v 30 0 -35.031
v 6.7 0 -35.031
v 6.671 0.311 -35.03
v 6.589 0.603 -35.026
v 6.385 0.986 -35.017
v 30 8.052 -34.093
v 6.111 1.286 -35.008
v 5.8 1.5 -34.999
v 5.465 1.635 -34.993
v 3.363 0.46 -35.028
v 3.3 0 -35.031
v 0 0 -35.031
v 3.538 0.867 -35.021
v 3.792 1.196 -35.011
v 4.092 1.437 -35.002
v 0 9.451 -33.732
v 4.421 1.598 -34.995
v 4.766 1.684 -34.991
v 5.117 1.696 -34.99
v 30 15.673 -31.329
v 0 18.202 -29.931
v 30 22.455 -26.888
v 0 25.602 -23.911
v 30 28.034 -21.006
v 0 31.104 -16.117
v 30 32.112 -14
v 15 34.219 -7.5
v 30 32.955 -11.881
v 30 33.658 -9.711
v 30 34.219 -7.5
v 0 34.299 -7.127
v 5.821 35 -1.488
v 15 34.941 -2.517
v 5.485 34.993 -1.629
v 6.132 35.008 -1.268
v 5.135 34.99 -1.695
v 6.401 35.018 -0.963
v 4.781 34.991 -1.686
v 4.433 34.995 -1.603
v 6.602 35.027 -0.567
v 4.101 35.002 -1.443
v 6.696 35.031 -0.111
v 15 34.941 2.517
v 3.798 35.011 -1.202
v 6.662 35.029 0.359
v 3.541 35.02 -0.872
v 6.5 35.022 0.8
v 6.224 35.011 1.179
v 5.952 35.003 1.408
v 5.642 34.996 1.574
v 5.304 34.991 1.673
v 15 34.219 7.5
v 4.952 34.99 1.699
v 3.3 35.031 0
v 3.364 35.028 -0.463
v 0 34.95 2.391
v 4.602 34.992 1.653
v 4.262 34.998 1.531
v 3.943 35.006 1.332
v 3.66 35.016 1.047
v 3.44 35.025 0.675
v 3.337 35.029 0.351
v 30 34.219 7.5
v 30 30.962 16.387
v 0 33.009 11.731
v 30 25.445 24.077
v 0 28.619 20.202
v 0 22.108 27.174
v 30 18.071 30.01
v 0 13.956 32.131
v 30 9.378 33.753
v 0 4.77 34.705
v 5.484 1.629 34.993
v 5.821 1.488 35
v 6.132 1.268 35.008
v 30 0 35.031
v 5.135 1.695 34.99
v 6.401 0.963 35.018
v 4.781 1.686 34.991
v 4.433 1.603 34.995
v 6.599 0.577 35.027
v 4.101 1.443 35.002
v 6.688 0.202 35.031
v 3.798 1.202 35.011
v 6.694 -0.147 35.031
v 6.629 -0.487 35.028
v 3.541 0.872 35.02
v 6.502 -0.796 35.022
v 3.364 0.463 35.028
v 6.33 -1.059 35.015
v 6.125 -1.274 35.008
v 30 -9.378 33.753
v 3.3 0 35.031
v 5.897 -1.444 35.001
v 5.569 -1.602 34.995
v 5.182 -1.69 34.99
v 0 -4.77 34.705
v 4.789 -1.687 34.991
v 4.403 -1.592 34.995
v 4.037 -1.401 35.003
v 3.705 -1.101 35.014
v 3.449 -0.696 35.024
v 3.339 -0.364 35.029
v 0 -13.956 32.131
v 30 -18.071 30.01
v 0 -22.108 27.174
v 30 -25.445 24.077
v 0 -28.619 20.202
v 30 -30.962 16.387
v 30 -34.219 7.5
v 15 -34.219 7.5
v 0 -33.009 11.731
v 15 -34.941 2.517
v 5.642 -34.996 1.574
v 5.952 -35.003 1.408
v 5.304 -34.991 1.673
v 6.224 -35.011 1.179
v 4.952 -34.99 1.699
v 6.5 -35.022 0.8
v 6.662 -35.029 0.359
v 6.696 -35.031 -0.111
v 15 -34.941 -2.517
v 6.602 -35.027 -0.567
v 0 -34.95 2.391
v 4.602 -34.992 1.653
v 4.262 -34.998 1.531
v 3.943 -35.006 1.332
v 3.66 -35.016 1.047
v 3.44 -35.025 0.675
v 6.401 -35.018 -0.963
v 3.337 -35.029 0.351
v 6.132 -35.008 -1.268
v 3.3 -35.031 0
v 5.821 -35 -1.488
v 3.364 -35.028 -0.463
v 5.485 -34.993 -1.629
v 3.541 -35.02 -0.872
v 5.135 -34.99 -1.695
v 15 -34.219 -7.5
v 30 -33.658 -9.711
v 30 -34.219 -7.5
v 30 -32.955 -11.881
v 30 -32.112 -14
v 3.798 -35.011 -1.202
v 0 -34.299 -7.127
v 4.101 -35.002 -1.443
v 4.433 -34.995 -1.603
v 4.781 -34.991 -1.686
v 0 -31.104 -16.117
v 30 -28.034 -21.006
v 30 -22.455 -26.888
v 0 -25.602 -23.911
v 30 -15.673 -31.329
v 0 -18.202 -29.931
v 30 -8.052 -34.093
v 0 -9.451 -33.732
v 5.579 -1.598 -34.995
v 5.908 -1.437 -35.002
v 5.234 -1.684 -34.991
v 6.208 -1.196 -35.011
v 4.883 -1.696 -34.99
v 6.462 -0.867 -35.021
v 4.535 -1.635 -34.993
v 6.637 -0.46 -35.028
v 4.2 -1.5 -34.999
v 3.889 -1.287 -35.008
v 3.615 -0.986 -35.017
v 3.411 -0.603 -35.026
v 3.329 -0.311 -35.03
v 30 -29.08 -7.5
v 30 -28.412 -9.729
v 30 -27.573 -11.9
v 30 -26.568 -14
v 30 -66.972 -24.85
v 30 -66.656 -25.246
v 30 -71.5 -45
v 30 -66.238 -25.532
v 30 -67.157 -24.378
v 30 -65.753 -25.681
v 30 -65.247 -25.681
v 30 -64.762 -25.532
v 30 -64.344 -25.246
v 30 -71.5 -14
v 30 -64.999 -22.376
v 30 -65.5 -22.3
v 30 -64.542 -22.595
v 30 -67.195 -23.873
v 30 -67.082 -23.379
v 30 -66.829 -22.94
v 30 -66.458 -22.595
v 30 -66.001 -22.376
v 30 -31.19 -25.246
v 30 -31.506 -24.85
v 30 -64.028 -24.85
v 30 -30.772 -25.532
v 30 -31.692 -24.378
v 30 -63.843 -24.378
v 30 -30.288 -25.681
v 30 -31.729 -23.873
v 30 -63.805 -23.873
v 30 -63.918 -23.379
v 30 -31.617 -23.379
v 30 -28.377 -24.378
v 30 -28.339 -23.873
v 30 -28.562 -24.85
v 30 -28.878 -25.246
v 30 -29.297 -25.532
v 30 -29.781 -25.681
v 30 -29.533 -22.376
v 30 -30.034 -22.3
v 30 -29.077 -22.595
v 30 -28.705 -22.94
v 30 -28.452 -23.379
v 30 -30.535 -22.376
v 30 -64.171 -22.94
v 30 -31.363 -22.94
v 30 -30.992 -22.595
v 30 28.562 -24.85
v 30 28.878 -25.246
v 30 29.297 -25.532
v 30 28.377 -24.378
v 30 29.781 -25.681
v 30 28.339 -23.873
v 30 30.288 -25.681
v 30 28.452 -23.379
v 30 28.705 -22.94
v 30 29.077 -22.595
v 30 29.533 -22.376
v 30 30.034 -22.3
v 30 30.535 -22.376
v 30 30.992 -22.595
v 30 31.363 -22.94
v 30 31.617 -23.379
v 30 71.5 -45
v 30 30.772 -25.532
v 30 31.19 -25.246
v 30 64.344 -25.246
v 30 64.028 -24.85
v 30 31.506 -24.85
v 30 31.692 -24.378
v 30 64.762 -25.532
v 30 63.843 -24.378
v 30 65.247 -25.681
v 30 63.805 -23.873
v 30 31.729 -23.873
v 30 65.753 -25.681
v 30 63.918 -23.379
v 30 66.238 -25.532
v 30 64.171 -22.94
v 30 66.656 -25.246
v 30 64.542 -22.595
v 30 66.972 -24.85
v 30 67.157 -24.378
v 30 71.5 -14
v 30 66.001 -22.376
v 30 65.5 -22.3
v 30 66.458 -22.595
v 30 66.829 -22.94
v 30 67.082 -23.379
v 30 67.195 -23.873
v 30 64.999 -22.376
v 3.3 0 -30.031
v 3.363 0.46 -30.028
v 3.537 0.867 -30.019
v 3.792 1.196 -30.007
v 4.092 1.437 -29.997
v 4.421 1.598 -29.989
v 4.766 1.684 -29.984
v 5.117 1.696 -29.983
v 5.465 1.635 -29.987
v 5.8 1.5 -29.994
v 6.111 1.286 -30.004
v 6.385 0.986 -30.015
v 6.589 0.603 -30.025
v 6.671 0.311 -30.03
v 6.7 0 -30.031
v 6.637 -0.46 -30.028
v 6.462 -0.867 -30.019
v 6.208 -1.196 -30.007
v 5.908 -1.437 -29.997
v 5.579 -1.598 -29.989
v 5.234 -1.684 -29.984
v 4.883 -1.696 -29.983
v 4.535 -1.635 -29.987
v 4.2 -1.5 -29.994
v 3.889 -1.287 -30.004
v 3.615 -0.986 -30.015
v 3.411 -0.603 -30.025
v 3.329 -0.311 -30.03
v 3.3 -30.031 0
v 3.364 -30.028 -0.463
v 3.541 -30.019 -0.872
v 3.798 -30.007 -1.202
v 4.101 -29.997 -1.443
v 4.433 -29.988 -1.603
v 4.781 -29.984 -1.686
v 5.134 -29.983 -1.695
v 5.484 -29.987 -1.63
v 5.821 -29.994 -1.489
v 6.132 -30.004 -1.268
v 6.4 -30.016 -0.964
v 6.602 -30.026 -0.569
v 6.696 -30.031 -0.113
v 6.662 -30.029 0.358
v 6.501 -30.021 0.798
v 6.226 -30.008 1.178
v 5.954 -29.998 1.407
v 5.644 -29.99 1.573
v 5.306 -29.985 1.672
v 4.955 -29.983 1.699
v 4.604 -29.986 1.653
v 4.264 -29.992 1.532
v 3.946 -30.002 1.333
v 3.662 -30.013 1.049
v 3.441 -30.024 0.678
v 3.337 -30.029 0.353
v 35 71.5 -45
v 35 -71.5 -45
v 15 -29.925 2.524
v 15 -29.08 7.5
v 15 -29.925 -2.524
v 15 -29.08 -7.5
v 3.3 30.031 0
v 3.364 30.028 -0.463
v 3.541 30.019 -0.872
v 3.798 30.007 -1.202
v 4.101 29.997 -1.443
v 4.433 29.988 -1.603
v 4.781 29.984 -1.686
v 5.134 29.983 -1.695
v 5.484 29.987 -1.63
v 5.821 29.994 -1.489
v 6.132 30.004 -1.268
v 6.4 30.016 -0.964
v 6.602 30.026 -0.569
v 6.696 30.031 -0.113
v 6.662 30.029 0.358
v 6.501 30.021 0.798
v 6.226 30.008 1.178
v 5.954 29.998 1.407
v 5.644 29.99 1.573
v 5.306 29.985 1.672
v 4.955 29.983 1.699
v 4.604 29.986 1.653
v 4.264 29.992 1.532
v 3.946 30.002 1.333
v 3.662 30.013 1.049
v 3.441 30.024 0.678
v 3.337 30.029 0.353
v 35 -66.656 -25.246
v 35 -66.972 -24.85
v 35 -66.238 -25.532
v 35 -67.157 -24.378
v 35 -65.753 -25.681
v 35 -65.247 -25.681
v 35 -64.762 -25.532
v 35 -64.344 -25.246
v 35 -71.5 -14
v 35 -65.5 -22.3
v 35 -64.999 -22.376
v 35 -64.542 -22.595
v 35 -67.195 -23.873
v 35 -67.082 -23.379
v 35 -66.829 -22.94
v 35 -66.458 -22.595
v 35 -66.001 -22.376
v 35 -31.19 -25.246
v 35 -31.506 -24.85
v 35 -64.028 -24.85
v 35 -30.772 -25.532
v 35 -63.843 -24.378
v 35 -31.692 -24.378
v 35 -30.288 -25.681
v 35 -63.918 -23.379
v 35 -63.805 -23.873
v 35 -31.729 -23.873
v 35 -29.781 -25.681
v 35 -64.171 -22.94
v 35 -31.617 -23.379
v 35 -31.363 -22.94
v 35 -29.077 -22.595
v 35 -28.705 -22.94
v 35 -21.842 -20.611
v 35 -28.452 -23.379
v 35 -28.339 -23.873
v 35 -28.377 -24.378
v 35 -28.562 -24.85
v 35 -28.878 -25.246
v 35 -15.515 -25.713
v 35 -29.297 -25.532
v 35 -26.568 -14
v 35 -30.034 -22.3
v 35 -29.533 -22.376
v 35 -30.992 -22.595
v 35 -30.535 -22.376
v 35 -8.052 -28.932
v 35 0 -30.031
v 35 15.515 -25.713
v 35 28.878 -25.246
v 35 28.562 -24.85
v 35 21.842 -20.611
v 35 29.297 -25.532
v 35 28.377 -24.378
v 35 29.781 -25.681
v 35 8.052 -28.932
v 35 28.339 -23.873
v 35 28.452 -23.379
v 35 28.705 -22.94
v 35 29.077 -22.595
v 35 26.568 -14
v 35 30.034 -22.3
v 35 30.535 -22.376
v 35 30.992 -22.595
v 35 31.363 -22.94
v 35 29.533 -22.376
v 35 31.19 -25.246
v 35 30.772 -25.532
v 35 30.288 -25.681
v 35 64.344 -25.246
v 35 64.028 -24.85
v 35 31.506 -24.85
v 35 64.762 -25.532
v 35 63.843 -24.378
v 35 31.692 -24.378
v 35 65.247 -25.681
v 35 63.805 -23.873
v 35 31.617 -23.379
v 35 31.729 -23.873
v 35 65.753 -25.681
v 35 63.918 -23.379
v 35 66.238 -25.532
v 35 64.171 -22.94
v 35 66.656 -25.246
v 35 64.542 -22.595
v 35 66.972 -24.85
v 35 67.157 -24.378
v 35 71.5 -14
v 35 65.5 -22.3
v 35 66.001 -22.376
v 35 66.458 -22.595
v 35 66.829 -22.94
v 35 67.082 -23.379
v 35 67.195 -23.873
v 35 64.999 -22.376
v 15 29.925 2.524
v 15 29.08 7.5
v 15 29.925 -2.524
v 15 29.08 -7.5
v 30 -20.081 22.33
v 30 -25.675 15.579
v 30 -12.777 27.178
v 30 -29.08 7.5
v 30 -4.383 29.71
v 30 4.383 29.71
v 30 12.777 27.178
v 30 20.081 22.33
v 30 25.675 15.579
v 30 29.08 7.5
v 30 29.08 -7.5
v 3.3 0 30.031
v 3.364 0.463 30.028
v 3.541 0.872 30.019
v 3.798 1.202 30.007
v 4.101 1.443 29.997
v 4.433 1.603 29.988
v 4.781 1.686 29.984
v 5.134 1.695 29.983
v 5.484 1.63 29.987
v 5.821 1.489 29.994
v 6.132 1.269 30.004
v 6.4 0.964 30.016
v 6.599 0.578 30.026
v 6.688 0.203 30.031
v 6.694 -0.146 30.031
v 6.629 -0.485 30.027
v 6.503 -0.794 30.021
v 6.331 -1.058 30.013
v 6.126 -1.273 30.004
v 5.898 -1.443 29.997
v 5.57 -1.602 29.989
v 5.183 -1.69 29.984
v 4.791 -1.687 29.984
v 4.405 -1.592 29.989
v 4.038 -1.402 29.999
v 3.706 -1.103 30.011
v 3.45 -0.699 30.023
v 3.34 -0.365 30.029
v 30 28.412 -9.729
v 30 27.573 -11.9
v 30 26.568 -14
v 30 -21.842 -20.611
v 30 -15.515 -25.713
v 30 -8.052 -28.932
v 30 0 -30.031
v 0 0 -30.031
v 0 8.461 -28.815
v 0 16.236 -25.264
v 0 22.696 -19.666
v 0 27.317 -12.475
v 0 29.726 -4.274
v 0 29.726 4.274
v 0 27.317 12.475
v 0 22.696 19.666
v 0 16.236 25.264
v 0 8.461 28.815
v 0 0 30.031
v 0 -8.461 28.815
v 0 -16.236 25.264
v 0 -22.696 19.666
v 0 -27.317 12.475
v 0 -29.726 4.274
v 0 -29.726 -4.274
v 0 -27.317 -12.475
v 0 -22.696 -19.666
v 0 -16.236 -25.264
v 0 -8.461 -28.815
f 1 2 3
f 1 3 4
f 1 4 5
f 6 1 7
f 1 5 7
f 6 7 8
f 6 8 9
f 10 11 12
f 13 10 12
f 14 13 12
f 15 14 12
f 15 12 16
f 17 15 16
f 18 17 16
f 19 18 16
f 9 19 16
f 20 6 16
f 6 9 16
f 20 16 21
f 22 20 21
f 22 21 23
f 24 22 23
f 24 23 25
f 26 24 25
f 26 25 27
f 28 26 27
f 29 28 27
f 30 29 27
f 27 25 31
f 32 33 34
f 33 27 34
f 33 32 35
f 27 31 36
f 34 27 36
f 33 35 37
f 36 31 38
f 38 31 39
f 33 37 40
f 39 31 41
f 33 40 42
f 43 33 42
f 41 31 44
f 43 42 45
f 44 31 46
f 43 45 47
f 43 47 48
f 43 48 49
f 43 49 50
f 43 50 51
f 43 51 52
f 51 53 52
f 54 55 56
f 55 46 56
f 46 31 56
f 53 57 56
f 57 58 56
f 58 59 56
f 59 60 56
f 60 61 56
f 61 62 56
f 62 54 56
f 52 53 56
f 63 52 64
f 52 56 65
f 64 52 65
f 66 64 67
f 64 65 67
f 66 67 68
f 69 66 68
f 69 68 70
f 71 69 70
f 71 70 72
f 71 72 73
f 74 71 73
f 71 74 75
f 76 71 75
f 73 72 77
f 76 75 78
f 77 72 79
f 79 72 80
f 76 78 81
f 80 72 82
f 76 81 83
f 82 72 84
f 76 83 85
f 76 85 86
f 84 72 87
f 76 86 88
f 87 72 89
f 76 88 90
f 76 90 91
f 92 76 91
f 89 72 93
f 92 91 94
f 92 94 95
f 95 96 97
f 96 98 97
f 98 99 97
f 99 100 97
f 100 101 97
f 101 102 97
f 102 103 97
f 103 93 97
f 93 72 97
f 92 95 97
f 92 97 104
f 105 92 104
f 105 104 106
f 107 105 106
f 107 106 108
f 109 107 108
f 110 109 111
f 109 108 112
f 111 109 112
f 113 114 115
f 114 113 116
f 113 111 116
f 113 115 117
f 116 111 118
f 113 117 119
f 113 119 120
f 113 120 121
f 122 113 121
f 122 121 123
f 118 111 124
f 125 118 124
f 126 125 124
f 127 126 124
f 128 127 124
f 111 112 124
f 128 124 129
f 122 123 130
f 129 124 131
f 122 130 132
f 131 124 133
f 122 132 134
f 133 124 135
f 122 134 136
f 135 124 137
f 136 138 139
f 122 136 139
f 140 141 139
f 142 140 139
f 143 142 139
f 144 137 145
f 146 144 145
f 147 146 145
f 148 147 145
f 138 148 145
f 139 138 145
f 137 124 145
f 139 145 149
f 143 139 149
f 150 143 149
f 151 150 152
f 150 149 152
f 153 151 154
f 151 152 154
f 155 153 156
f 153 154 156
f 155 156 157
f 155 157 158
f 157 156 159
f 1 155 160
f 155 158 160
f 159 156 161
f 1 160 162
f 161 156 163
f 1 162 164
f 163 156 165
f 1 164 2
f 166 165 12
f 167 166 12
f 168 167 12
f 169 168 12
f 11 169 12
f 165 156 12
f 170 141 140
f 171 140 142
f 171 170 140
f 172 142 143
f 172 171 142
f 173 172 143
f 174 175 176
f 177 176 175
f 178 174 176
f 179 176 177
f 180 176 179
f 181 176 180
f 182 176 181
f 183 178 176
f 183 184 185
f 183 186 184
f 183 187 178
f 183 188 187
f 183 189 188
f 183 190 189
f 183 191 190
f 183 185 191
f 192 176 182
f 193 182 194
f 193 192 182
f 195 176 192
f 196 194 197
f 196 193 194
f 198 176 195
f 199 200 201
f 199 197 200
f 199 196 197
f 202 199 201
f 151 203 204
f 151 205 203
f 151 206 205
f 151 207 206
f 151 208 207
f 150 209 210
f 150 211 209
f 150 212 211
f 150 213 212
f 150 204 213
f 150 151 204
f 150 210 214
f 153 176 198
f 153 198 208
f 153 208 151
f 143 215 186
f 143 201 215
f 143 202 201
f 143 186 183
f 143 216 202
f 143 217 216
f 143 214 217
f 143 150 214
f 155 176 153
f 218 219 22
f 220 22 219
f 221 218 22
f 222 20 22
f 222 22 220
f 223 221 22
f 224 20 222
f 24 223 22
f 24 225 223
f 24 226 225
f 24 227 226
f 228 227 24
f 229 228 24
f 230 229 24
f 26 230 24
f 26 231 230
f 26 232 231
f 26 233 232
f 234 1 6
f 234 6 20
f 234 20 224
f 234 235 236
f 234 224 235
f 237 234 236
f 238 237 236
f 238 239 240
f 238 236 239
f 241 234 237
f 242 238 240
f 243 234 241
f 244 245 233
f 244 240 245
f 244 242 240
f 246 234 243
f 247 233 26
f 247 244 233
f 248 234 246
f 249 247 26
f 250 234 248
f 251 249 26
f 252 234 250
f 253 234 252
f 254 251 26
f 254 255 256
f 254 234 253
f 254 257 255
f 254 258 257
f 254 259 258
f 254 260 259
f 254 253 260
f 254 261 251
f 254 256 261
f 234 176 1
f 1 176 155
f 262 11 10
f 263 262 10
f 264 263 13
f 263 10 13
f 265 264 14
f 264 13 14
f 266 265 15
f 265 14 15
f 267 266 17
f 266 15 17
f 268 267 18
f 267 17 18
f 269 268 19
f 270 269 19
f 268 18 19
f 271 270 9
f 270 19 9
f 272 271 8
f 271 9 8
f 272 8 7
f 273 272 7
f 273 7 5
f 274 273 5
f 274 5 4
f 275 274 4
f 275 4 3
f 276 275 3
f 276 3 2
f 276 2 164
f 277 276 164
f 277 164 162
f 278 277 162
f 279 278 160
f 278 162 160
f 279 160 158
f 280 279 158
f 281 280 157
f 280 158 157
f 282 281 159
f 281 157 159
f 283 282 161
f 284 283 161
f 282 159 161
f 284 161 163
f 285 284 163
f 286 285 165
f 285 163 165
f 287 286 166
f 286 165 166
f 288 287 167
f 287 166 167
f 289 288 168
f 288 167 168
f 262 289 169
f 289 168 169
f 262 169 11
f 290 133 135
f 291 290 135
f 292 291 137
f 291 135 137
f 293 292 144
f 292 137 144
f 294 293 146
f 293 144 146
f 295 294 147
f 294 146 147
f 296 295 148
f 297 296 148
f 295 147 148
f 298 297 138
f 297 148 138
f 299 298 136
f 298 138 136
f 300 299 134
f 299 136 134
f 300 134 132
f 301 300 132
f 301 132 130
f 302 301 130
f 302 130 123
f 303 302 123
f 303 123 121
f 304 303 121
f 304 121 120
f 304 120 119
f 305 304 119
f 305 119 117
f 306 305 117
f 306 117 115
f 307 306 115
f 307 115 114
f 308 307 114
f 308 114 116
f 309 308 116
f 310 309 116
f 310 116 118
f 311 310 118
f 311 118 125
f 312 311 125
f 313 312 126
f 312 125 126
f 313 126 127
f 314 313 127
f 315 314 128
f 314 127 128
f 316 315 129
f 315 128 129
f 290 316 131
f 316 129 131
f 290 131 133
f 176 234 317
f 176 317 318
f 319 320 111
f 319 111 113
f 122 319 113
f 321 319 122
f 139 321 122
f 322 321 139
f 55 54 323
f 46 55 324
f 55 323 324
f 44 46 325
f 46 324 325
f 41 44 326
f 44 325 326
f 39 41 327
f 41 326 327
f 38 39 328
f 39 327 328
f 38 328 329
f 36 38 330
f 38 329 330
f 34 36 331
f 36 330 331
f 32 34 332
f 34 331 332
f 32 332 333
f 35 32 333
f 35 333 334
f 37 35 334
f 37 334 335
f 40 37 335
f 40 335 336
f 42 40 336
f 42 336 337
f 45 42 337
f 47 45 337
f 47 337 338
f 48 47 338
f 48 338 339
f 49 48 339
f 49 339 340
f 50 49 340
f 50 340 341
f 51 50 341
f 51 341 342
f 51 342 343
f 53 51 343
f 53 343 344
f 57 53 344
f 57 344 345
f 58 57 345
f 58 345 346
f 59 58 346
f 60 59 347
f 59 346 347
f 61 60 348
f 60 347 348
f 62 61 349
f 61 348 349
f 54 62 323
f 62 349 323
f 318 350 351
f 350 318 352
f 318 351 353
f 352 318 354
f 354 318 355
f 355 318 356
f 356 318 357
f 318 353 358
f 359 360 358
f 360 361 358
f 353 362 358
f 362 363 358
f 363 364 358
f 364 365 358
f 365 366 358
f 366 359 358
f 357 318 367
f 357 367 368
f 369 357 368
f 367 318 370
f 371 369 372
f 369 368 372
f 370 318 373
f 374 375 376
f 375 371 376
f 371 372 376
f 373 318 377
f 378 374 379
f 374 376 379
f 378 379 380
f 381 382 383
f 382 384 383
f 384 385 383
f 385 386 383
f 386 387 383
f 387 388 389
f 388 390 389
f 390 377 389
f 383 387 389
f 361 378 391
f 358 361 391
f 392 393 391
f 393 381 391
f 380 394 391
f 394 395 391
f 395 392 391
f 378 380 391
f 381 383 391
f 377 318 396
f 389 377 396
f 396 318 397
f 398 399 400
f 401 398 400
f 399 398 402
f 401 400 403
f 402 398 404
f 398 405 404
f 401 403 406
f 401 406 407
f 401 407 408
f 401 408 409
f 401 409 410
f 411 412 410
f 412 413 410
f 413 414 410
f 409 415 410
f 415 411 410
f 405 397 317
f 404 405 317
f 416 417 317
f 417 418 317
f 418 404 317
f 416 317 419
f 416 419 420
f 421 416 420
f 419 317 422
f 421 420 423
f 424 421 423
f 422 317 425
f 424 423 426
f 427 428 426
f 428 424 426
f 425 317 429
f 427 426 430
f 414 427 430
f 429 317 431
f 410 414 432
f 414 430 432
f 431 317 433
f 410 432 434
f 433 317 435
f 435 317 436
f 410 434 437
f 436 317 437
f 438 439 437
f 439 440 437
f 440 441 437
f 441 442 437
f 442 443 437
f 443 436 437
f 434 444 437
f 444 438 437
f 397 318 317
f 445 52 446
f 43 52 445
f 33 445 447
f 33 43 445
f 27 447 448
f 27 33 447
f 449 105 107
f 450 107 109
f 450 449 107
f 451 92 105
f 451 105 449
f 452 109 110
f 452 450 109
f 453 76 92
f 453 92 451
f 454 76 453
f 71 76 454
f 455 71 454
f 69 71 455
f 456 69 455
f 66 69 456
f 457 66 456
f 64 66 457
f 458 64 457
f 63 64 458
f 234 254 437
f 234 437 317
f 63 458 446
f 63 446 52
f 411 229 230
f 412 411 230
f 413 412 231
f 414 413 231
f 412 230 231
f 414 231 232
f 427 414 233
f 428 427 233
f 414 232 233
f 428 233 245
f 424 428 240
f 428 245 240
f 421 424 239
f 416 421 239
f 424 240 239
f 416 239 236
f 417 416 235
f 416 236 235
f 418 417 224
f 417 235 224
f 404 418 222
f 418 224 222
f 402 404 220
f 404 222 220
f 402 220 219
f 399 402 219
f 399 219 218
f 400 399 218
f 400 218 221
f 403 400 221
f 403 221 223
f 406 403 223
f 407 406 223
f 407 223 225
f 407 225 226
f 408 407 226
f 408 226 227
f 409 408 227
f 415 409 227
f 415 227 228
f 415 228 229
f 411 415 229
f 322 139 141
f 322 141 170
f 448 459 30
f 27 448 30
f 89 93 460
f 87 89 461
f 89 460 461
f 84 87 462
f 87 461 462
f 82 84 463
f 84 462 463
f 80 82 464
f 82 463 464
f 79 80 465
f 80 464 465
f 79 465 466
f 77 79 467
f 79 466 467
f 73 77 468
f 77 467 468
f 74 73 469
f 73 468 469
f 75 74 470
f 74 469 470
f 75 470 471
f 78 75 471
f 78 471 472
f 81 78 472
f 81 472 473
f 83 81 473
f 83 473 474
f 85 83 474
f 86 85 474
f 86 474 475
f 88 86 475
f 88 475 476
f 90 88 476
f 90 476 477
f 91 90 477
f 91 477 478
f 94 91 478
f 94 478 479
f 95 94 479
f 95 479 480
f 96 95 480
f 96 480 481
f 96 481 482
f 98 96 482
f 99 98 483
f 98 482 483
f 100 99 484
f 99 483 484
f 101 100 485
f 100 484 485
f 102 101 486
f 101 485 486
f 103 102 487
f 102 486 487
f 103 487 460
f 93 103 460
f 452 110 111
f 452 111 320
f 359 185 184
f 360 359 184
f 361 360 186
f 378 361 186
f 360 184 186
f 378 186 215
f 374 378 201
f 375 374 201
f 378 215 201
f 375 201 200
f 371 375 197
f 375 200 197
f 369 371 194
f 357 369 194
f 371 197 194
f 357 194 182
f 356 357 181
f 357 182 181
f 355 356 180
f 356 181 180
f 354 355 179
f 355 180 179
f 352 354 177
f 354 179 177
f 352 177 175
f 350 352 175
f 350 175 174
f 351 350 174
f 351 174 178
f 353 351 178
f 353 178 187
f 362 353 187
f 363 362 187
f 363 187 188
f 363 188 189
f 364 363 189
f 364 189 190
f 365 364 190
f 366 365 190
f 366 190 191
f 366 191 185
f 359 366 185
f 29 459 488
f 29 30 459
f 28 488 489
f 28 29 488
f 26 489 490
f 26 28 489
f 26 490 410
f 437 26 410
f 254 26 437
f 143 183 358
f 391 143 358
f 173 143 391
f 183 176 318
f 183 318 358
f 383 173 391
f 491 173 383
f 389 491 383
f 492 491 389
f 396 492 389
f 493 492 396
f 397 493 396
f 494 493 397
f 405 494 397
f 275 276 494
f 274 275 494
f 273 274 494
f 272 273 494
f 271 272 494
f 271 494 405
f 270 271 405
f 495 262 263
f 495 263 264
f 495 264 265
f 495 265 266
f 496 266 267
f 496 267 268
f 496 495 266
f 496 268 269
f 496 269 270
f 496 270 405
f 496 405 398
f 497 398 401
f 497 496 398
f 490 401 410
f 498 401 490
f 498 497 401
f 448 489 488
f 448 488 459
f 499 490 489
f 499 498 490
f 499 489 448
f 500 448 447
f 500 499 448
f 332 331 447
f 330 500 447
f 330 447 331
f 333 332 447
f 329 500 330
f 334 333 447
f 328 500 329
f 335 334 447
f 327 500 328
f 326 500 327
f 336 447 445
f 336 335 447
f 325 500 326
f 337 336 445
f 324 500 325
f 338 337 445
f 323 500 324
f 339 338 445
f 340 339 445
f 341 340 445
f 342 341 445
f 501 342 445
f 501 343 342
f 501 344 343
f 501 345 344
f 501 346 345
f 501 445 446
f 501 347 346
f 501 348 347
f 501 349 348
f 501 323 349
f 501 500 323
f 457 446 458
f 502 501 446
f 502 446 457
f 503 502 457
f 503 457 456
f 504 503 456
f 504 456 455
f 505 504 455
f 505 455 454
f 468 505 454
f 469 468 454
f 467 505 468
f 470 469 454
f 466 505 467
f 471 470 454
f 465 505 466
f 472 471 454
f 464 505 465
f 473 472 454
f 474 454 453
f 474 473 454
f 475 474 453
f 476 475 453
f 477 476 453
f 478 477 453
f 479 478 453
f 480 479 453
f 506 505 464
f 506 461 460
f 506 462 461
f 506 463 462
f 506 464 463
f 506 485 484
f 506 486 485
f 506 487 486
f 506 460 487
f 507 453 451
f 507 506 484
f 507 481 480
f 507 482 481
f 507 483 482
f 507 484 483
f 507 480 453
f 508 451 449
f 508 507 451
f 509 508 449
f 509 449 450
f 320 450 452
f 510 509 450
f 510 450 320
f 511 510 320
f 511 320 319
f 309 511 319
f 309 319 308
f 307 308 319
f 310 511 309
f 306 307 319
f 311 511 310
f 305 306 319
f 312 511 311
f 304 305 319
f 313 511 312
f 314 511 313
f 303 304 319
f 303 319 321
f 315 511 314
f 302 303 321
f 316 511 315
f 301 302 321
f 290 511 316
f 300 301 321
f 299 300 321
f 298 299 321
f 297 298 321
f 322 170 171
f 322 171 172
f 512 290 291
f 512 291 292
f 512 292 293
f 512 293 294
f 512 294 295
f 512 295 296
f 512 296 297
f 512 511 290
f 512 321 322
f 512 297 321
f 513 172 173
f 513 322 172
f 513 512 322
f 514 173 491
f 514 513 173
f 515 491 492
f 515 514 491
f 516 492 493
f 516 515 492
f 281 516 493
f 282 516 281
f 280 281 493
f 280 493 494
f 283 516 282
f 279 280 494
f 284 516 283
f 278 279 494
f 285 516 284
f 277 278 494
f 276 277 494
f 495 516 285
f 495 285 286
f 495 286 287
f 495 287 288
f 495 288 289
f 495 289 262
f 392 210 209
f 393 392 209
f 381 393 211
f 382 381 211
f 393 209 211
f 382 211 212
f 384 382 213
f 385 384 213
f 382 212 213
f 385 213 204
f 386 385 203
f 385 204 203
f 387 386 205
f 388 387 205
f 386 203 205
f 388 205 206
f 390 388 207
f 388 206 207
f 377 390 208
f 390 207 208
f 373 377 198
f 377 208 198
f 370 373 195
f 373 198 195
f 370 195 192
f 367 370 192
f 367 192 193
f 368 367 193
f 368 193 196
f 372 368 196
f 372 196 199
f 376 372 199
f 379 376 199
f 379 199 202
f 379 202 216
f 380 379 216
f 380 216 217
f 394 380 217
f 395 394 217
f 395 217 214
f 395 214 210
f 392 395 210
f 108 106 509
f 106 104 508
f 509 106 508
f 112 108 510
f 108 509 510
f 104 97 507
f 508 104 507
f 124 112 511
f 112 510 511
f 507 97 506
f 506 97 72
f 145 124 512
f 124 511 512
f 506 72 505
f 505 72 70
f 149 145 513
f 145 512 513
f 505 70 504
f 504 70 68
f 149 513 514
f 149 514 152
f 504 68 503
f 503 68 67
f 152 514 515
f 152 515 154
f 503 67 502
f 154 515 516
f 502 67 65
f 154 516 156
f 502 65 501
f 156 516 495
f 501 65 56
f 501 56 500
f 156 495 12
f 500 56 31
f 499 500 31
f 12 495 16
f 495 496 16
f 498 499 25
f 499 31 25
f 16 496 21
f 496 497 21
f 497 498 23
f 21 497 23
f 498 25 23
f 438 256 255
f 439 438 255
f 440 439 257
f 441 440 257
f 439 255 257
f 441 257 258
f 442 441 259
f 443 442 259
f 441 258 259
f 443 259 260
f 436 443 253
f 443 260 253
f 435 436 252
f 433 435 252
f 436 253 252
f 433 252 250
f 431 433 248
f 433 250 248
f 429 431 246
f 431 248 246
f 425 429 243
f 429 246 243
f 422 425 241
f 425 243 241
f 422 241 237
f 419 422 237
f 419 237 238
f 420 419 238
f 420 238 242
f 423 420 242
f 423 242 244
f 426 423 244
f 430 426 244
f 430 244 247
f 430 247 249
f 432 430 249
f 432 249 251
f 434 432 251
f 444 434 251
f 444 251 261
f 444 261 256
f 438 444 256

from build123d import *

# Parameters (mm, degrees)
SKETCH1_R            = 35.03125
SKETCH1_R_2          = 30.03125
BOSS_EXTRUDE1_DEPTH  = 30
M3_CLEARANCE_HOLE2_D = 3.4
M3_CLEARANCE_HOLE3_D = 3.4
BOSS_EXTRUDE2_DEPTH  = 5
M3_CLEARANCE_HOLE4_D = 3.4
SKETCH14_W           = 15
SKETCH14_H           = 123.928098147
CUT_EXTRUDE1_DEPTH   = 15


with BuildPart() as part:
    # Sketch1 → Boss-Extrude1 (new body)
    with BuildSketch(Plane(origin=(0, 0, 0), x_dir=(0, 0, -1), z_dir=(1, 0, 0))):
        Circle(SKETCH1_R)
        Circle(SKETCH1_R_2, mode=Mode.SUBTRACT)
    extrude(amount=BOSS_EXTRUDE1_DEPTH)

    # M3 Clearance Hole2 (through all)
    with Locations(Plane(origin=(0, 35.03125, 0), x_dir=(1, 0, 0), z_dir=(0, 1, 0))):
        with Locations((5, 0)):
            Hole(M3_CLEARANCE_HOLE2_D / 2)

    # M3 Clearance Hole3 (through all)
    with Locations(Plane.XY.offset(35.03125)):
        with Locations((5, 0)):
            Hole(M3_CLEARANCE_HOLE3_D / 2)

    # Sketch9 → Boss-Extrude2 (add)
    with BuildSketch(Plane(origin=(30, 0, 0), x_dir=(0, 0, -1), z_dir=(1, 0, 0))):
        with BuildLine():
            Line((14, 71.5), (45, 71.5))
            Line((45, 71.5), (45, -71.5))
            Line((45, -71.5), (14, -71.5))
            Line((14, -71.5), (14, -26.568326567))
            ThreePointArc((14, -26.568326567), (30.03125, 0), (14, 26.568326567))
            Line((14, 26.568326567), (14, 71.5))
        make_face()
    extrude(amount=BOSS_EXTRUDE2_DEPTH)

    # M3 Clearance Hole4 (through all)
    with Locations(Plane(origin=(35, 0, 0), x_dir=(0, 0, -1), z_dir=(1, 0, 0))):
        with Locations((24, 30.034163283), (24, 65.5), (24, -65.5), (24, -30.034163283)):
            Hole(M3_CLEARANCE_HOLE4_D / 2)

    # Sketch14 → Cut-Extrude1 (cut)
    with BuildSketch(Plane(origin=(30, 0, 0), x_dir=(0, 0, -1), z_dir=(1, 0, 0))):
        with Locations((0, 15.044796635)):
            Rectangle(SKETCH14_W, SKETCH14_H)
    extrude(amount=-CUT_EXTRUDE1_DEPTH, mode=Mode.SUBTRACT)


solid = part.part
